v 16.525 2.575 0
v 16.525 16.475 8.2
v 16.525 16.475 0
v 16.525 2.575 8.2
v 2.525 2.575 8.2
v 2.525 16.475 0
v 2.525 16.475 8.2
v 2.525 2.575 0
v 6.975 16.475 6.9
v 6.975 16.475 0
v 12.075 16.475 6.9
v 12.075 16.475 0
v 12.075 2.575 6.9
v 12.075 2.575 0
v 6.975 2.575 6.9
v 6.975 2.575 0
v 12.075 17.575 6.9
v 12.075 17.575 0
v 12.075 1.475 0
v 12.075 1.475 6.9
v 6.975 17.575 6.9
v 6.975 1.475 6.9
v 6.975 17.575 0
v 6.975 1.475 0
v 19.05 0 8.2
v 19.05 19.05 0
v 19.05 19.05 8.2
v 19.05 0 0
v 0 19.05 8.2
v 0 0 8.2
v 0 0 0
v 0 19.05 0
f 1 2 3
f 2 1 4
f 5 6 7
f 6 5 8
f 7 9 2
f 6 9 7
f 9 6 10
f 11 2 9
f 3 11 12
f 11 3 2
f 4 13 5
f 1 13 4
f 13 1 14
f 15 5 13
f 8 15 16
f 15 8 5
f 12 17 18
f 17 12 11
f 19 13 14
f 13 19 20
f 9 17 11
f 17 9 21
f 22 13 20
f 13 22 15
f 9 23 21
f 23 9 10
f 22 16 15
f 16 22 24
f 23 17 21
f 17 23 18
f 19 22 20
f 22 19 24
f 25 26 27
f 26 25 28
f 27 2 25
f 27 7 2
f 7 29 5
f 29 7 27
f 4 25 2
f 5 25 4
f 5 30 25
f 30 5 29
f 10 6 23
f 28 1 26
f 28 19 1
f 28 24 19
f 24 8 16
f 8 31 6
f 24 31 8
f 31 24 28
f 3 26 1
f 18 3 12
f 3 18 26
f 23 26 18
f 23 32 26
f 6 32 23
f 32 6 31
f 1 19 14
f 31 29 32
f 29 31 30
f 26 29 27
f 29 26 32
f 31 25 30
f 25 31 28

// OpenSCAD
SOCKET_DIMENSION = 19.05;
SOCKET_HEIGHT = 8.2;

function socket_centre(position) =
	let(
		half_socket = SOCKET_DIMENSION / 2
	)
		[position.x + half_socket, position.y + half_socket, position.z];

function xy_centre(dimension) =
	[-dimension.x / 2, -dimension.y / 2, 0];

function grow(dimensions, factors) =
	[dimensions.x + factors.x, dimensions.y + factors.y, dimensions.z + factors.z];
	

module SocketOuter(position) {
		translate(position)
			cube([SOCKET_DIMENSION, SOCKET_DIMENSION, 8.2]);
}

module SocketCutout(position) {
	let (
		tolerance = 0.1,
		cutout_a_dimension = grow([13.9, 13.8, SOCKET_HEIGHT], [tolerance, tolerance, tolerance * 2]),
		cutout_b_dimension = grow([5, 16, SOCKET_HEIGHT - 1.4], [tolerance, tolerance, tolerance * 2])
	)
	union() {
		translate(socket_centre(position))
		translate([0, 0, -0.1])
		translate(xy_centre(cutout_a_dimension))
			cube(cutout_a_dimension);
		translate(socket_centre(position))
		translate([0, 0, -0.1])
		translate(xy_centre(cutout_b_dimension))
			cube(cutout_b_dimension);
	}
}

difference() {
	SocketOuter([0, 0, 0]);
	SocketCutout([0, 0, 0]);
}
